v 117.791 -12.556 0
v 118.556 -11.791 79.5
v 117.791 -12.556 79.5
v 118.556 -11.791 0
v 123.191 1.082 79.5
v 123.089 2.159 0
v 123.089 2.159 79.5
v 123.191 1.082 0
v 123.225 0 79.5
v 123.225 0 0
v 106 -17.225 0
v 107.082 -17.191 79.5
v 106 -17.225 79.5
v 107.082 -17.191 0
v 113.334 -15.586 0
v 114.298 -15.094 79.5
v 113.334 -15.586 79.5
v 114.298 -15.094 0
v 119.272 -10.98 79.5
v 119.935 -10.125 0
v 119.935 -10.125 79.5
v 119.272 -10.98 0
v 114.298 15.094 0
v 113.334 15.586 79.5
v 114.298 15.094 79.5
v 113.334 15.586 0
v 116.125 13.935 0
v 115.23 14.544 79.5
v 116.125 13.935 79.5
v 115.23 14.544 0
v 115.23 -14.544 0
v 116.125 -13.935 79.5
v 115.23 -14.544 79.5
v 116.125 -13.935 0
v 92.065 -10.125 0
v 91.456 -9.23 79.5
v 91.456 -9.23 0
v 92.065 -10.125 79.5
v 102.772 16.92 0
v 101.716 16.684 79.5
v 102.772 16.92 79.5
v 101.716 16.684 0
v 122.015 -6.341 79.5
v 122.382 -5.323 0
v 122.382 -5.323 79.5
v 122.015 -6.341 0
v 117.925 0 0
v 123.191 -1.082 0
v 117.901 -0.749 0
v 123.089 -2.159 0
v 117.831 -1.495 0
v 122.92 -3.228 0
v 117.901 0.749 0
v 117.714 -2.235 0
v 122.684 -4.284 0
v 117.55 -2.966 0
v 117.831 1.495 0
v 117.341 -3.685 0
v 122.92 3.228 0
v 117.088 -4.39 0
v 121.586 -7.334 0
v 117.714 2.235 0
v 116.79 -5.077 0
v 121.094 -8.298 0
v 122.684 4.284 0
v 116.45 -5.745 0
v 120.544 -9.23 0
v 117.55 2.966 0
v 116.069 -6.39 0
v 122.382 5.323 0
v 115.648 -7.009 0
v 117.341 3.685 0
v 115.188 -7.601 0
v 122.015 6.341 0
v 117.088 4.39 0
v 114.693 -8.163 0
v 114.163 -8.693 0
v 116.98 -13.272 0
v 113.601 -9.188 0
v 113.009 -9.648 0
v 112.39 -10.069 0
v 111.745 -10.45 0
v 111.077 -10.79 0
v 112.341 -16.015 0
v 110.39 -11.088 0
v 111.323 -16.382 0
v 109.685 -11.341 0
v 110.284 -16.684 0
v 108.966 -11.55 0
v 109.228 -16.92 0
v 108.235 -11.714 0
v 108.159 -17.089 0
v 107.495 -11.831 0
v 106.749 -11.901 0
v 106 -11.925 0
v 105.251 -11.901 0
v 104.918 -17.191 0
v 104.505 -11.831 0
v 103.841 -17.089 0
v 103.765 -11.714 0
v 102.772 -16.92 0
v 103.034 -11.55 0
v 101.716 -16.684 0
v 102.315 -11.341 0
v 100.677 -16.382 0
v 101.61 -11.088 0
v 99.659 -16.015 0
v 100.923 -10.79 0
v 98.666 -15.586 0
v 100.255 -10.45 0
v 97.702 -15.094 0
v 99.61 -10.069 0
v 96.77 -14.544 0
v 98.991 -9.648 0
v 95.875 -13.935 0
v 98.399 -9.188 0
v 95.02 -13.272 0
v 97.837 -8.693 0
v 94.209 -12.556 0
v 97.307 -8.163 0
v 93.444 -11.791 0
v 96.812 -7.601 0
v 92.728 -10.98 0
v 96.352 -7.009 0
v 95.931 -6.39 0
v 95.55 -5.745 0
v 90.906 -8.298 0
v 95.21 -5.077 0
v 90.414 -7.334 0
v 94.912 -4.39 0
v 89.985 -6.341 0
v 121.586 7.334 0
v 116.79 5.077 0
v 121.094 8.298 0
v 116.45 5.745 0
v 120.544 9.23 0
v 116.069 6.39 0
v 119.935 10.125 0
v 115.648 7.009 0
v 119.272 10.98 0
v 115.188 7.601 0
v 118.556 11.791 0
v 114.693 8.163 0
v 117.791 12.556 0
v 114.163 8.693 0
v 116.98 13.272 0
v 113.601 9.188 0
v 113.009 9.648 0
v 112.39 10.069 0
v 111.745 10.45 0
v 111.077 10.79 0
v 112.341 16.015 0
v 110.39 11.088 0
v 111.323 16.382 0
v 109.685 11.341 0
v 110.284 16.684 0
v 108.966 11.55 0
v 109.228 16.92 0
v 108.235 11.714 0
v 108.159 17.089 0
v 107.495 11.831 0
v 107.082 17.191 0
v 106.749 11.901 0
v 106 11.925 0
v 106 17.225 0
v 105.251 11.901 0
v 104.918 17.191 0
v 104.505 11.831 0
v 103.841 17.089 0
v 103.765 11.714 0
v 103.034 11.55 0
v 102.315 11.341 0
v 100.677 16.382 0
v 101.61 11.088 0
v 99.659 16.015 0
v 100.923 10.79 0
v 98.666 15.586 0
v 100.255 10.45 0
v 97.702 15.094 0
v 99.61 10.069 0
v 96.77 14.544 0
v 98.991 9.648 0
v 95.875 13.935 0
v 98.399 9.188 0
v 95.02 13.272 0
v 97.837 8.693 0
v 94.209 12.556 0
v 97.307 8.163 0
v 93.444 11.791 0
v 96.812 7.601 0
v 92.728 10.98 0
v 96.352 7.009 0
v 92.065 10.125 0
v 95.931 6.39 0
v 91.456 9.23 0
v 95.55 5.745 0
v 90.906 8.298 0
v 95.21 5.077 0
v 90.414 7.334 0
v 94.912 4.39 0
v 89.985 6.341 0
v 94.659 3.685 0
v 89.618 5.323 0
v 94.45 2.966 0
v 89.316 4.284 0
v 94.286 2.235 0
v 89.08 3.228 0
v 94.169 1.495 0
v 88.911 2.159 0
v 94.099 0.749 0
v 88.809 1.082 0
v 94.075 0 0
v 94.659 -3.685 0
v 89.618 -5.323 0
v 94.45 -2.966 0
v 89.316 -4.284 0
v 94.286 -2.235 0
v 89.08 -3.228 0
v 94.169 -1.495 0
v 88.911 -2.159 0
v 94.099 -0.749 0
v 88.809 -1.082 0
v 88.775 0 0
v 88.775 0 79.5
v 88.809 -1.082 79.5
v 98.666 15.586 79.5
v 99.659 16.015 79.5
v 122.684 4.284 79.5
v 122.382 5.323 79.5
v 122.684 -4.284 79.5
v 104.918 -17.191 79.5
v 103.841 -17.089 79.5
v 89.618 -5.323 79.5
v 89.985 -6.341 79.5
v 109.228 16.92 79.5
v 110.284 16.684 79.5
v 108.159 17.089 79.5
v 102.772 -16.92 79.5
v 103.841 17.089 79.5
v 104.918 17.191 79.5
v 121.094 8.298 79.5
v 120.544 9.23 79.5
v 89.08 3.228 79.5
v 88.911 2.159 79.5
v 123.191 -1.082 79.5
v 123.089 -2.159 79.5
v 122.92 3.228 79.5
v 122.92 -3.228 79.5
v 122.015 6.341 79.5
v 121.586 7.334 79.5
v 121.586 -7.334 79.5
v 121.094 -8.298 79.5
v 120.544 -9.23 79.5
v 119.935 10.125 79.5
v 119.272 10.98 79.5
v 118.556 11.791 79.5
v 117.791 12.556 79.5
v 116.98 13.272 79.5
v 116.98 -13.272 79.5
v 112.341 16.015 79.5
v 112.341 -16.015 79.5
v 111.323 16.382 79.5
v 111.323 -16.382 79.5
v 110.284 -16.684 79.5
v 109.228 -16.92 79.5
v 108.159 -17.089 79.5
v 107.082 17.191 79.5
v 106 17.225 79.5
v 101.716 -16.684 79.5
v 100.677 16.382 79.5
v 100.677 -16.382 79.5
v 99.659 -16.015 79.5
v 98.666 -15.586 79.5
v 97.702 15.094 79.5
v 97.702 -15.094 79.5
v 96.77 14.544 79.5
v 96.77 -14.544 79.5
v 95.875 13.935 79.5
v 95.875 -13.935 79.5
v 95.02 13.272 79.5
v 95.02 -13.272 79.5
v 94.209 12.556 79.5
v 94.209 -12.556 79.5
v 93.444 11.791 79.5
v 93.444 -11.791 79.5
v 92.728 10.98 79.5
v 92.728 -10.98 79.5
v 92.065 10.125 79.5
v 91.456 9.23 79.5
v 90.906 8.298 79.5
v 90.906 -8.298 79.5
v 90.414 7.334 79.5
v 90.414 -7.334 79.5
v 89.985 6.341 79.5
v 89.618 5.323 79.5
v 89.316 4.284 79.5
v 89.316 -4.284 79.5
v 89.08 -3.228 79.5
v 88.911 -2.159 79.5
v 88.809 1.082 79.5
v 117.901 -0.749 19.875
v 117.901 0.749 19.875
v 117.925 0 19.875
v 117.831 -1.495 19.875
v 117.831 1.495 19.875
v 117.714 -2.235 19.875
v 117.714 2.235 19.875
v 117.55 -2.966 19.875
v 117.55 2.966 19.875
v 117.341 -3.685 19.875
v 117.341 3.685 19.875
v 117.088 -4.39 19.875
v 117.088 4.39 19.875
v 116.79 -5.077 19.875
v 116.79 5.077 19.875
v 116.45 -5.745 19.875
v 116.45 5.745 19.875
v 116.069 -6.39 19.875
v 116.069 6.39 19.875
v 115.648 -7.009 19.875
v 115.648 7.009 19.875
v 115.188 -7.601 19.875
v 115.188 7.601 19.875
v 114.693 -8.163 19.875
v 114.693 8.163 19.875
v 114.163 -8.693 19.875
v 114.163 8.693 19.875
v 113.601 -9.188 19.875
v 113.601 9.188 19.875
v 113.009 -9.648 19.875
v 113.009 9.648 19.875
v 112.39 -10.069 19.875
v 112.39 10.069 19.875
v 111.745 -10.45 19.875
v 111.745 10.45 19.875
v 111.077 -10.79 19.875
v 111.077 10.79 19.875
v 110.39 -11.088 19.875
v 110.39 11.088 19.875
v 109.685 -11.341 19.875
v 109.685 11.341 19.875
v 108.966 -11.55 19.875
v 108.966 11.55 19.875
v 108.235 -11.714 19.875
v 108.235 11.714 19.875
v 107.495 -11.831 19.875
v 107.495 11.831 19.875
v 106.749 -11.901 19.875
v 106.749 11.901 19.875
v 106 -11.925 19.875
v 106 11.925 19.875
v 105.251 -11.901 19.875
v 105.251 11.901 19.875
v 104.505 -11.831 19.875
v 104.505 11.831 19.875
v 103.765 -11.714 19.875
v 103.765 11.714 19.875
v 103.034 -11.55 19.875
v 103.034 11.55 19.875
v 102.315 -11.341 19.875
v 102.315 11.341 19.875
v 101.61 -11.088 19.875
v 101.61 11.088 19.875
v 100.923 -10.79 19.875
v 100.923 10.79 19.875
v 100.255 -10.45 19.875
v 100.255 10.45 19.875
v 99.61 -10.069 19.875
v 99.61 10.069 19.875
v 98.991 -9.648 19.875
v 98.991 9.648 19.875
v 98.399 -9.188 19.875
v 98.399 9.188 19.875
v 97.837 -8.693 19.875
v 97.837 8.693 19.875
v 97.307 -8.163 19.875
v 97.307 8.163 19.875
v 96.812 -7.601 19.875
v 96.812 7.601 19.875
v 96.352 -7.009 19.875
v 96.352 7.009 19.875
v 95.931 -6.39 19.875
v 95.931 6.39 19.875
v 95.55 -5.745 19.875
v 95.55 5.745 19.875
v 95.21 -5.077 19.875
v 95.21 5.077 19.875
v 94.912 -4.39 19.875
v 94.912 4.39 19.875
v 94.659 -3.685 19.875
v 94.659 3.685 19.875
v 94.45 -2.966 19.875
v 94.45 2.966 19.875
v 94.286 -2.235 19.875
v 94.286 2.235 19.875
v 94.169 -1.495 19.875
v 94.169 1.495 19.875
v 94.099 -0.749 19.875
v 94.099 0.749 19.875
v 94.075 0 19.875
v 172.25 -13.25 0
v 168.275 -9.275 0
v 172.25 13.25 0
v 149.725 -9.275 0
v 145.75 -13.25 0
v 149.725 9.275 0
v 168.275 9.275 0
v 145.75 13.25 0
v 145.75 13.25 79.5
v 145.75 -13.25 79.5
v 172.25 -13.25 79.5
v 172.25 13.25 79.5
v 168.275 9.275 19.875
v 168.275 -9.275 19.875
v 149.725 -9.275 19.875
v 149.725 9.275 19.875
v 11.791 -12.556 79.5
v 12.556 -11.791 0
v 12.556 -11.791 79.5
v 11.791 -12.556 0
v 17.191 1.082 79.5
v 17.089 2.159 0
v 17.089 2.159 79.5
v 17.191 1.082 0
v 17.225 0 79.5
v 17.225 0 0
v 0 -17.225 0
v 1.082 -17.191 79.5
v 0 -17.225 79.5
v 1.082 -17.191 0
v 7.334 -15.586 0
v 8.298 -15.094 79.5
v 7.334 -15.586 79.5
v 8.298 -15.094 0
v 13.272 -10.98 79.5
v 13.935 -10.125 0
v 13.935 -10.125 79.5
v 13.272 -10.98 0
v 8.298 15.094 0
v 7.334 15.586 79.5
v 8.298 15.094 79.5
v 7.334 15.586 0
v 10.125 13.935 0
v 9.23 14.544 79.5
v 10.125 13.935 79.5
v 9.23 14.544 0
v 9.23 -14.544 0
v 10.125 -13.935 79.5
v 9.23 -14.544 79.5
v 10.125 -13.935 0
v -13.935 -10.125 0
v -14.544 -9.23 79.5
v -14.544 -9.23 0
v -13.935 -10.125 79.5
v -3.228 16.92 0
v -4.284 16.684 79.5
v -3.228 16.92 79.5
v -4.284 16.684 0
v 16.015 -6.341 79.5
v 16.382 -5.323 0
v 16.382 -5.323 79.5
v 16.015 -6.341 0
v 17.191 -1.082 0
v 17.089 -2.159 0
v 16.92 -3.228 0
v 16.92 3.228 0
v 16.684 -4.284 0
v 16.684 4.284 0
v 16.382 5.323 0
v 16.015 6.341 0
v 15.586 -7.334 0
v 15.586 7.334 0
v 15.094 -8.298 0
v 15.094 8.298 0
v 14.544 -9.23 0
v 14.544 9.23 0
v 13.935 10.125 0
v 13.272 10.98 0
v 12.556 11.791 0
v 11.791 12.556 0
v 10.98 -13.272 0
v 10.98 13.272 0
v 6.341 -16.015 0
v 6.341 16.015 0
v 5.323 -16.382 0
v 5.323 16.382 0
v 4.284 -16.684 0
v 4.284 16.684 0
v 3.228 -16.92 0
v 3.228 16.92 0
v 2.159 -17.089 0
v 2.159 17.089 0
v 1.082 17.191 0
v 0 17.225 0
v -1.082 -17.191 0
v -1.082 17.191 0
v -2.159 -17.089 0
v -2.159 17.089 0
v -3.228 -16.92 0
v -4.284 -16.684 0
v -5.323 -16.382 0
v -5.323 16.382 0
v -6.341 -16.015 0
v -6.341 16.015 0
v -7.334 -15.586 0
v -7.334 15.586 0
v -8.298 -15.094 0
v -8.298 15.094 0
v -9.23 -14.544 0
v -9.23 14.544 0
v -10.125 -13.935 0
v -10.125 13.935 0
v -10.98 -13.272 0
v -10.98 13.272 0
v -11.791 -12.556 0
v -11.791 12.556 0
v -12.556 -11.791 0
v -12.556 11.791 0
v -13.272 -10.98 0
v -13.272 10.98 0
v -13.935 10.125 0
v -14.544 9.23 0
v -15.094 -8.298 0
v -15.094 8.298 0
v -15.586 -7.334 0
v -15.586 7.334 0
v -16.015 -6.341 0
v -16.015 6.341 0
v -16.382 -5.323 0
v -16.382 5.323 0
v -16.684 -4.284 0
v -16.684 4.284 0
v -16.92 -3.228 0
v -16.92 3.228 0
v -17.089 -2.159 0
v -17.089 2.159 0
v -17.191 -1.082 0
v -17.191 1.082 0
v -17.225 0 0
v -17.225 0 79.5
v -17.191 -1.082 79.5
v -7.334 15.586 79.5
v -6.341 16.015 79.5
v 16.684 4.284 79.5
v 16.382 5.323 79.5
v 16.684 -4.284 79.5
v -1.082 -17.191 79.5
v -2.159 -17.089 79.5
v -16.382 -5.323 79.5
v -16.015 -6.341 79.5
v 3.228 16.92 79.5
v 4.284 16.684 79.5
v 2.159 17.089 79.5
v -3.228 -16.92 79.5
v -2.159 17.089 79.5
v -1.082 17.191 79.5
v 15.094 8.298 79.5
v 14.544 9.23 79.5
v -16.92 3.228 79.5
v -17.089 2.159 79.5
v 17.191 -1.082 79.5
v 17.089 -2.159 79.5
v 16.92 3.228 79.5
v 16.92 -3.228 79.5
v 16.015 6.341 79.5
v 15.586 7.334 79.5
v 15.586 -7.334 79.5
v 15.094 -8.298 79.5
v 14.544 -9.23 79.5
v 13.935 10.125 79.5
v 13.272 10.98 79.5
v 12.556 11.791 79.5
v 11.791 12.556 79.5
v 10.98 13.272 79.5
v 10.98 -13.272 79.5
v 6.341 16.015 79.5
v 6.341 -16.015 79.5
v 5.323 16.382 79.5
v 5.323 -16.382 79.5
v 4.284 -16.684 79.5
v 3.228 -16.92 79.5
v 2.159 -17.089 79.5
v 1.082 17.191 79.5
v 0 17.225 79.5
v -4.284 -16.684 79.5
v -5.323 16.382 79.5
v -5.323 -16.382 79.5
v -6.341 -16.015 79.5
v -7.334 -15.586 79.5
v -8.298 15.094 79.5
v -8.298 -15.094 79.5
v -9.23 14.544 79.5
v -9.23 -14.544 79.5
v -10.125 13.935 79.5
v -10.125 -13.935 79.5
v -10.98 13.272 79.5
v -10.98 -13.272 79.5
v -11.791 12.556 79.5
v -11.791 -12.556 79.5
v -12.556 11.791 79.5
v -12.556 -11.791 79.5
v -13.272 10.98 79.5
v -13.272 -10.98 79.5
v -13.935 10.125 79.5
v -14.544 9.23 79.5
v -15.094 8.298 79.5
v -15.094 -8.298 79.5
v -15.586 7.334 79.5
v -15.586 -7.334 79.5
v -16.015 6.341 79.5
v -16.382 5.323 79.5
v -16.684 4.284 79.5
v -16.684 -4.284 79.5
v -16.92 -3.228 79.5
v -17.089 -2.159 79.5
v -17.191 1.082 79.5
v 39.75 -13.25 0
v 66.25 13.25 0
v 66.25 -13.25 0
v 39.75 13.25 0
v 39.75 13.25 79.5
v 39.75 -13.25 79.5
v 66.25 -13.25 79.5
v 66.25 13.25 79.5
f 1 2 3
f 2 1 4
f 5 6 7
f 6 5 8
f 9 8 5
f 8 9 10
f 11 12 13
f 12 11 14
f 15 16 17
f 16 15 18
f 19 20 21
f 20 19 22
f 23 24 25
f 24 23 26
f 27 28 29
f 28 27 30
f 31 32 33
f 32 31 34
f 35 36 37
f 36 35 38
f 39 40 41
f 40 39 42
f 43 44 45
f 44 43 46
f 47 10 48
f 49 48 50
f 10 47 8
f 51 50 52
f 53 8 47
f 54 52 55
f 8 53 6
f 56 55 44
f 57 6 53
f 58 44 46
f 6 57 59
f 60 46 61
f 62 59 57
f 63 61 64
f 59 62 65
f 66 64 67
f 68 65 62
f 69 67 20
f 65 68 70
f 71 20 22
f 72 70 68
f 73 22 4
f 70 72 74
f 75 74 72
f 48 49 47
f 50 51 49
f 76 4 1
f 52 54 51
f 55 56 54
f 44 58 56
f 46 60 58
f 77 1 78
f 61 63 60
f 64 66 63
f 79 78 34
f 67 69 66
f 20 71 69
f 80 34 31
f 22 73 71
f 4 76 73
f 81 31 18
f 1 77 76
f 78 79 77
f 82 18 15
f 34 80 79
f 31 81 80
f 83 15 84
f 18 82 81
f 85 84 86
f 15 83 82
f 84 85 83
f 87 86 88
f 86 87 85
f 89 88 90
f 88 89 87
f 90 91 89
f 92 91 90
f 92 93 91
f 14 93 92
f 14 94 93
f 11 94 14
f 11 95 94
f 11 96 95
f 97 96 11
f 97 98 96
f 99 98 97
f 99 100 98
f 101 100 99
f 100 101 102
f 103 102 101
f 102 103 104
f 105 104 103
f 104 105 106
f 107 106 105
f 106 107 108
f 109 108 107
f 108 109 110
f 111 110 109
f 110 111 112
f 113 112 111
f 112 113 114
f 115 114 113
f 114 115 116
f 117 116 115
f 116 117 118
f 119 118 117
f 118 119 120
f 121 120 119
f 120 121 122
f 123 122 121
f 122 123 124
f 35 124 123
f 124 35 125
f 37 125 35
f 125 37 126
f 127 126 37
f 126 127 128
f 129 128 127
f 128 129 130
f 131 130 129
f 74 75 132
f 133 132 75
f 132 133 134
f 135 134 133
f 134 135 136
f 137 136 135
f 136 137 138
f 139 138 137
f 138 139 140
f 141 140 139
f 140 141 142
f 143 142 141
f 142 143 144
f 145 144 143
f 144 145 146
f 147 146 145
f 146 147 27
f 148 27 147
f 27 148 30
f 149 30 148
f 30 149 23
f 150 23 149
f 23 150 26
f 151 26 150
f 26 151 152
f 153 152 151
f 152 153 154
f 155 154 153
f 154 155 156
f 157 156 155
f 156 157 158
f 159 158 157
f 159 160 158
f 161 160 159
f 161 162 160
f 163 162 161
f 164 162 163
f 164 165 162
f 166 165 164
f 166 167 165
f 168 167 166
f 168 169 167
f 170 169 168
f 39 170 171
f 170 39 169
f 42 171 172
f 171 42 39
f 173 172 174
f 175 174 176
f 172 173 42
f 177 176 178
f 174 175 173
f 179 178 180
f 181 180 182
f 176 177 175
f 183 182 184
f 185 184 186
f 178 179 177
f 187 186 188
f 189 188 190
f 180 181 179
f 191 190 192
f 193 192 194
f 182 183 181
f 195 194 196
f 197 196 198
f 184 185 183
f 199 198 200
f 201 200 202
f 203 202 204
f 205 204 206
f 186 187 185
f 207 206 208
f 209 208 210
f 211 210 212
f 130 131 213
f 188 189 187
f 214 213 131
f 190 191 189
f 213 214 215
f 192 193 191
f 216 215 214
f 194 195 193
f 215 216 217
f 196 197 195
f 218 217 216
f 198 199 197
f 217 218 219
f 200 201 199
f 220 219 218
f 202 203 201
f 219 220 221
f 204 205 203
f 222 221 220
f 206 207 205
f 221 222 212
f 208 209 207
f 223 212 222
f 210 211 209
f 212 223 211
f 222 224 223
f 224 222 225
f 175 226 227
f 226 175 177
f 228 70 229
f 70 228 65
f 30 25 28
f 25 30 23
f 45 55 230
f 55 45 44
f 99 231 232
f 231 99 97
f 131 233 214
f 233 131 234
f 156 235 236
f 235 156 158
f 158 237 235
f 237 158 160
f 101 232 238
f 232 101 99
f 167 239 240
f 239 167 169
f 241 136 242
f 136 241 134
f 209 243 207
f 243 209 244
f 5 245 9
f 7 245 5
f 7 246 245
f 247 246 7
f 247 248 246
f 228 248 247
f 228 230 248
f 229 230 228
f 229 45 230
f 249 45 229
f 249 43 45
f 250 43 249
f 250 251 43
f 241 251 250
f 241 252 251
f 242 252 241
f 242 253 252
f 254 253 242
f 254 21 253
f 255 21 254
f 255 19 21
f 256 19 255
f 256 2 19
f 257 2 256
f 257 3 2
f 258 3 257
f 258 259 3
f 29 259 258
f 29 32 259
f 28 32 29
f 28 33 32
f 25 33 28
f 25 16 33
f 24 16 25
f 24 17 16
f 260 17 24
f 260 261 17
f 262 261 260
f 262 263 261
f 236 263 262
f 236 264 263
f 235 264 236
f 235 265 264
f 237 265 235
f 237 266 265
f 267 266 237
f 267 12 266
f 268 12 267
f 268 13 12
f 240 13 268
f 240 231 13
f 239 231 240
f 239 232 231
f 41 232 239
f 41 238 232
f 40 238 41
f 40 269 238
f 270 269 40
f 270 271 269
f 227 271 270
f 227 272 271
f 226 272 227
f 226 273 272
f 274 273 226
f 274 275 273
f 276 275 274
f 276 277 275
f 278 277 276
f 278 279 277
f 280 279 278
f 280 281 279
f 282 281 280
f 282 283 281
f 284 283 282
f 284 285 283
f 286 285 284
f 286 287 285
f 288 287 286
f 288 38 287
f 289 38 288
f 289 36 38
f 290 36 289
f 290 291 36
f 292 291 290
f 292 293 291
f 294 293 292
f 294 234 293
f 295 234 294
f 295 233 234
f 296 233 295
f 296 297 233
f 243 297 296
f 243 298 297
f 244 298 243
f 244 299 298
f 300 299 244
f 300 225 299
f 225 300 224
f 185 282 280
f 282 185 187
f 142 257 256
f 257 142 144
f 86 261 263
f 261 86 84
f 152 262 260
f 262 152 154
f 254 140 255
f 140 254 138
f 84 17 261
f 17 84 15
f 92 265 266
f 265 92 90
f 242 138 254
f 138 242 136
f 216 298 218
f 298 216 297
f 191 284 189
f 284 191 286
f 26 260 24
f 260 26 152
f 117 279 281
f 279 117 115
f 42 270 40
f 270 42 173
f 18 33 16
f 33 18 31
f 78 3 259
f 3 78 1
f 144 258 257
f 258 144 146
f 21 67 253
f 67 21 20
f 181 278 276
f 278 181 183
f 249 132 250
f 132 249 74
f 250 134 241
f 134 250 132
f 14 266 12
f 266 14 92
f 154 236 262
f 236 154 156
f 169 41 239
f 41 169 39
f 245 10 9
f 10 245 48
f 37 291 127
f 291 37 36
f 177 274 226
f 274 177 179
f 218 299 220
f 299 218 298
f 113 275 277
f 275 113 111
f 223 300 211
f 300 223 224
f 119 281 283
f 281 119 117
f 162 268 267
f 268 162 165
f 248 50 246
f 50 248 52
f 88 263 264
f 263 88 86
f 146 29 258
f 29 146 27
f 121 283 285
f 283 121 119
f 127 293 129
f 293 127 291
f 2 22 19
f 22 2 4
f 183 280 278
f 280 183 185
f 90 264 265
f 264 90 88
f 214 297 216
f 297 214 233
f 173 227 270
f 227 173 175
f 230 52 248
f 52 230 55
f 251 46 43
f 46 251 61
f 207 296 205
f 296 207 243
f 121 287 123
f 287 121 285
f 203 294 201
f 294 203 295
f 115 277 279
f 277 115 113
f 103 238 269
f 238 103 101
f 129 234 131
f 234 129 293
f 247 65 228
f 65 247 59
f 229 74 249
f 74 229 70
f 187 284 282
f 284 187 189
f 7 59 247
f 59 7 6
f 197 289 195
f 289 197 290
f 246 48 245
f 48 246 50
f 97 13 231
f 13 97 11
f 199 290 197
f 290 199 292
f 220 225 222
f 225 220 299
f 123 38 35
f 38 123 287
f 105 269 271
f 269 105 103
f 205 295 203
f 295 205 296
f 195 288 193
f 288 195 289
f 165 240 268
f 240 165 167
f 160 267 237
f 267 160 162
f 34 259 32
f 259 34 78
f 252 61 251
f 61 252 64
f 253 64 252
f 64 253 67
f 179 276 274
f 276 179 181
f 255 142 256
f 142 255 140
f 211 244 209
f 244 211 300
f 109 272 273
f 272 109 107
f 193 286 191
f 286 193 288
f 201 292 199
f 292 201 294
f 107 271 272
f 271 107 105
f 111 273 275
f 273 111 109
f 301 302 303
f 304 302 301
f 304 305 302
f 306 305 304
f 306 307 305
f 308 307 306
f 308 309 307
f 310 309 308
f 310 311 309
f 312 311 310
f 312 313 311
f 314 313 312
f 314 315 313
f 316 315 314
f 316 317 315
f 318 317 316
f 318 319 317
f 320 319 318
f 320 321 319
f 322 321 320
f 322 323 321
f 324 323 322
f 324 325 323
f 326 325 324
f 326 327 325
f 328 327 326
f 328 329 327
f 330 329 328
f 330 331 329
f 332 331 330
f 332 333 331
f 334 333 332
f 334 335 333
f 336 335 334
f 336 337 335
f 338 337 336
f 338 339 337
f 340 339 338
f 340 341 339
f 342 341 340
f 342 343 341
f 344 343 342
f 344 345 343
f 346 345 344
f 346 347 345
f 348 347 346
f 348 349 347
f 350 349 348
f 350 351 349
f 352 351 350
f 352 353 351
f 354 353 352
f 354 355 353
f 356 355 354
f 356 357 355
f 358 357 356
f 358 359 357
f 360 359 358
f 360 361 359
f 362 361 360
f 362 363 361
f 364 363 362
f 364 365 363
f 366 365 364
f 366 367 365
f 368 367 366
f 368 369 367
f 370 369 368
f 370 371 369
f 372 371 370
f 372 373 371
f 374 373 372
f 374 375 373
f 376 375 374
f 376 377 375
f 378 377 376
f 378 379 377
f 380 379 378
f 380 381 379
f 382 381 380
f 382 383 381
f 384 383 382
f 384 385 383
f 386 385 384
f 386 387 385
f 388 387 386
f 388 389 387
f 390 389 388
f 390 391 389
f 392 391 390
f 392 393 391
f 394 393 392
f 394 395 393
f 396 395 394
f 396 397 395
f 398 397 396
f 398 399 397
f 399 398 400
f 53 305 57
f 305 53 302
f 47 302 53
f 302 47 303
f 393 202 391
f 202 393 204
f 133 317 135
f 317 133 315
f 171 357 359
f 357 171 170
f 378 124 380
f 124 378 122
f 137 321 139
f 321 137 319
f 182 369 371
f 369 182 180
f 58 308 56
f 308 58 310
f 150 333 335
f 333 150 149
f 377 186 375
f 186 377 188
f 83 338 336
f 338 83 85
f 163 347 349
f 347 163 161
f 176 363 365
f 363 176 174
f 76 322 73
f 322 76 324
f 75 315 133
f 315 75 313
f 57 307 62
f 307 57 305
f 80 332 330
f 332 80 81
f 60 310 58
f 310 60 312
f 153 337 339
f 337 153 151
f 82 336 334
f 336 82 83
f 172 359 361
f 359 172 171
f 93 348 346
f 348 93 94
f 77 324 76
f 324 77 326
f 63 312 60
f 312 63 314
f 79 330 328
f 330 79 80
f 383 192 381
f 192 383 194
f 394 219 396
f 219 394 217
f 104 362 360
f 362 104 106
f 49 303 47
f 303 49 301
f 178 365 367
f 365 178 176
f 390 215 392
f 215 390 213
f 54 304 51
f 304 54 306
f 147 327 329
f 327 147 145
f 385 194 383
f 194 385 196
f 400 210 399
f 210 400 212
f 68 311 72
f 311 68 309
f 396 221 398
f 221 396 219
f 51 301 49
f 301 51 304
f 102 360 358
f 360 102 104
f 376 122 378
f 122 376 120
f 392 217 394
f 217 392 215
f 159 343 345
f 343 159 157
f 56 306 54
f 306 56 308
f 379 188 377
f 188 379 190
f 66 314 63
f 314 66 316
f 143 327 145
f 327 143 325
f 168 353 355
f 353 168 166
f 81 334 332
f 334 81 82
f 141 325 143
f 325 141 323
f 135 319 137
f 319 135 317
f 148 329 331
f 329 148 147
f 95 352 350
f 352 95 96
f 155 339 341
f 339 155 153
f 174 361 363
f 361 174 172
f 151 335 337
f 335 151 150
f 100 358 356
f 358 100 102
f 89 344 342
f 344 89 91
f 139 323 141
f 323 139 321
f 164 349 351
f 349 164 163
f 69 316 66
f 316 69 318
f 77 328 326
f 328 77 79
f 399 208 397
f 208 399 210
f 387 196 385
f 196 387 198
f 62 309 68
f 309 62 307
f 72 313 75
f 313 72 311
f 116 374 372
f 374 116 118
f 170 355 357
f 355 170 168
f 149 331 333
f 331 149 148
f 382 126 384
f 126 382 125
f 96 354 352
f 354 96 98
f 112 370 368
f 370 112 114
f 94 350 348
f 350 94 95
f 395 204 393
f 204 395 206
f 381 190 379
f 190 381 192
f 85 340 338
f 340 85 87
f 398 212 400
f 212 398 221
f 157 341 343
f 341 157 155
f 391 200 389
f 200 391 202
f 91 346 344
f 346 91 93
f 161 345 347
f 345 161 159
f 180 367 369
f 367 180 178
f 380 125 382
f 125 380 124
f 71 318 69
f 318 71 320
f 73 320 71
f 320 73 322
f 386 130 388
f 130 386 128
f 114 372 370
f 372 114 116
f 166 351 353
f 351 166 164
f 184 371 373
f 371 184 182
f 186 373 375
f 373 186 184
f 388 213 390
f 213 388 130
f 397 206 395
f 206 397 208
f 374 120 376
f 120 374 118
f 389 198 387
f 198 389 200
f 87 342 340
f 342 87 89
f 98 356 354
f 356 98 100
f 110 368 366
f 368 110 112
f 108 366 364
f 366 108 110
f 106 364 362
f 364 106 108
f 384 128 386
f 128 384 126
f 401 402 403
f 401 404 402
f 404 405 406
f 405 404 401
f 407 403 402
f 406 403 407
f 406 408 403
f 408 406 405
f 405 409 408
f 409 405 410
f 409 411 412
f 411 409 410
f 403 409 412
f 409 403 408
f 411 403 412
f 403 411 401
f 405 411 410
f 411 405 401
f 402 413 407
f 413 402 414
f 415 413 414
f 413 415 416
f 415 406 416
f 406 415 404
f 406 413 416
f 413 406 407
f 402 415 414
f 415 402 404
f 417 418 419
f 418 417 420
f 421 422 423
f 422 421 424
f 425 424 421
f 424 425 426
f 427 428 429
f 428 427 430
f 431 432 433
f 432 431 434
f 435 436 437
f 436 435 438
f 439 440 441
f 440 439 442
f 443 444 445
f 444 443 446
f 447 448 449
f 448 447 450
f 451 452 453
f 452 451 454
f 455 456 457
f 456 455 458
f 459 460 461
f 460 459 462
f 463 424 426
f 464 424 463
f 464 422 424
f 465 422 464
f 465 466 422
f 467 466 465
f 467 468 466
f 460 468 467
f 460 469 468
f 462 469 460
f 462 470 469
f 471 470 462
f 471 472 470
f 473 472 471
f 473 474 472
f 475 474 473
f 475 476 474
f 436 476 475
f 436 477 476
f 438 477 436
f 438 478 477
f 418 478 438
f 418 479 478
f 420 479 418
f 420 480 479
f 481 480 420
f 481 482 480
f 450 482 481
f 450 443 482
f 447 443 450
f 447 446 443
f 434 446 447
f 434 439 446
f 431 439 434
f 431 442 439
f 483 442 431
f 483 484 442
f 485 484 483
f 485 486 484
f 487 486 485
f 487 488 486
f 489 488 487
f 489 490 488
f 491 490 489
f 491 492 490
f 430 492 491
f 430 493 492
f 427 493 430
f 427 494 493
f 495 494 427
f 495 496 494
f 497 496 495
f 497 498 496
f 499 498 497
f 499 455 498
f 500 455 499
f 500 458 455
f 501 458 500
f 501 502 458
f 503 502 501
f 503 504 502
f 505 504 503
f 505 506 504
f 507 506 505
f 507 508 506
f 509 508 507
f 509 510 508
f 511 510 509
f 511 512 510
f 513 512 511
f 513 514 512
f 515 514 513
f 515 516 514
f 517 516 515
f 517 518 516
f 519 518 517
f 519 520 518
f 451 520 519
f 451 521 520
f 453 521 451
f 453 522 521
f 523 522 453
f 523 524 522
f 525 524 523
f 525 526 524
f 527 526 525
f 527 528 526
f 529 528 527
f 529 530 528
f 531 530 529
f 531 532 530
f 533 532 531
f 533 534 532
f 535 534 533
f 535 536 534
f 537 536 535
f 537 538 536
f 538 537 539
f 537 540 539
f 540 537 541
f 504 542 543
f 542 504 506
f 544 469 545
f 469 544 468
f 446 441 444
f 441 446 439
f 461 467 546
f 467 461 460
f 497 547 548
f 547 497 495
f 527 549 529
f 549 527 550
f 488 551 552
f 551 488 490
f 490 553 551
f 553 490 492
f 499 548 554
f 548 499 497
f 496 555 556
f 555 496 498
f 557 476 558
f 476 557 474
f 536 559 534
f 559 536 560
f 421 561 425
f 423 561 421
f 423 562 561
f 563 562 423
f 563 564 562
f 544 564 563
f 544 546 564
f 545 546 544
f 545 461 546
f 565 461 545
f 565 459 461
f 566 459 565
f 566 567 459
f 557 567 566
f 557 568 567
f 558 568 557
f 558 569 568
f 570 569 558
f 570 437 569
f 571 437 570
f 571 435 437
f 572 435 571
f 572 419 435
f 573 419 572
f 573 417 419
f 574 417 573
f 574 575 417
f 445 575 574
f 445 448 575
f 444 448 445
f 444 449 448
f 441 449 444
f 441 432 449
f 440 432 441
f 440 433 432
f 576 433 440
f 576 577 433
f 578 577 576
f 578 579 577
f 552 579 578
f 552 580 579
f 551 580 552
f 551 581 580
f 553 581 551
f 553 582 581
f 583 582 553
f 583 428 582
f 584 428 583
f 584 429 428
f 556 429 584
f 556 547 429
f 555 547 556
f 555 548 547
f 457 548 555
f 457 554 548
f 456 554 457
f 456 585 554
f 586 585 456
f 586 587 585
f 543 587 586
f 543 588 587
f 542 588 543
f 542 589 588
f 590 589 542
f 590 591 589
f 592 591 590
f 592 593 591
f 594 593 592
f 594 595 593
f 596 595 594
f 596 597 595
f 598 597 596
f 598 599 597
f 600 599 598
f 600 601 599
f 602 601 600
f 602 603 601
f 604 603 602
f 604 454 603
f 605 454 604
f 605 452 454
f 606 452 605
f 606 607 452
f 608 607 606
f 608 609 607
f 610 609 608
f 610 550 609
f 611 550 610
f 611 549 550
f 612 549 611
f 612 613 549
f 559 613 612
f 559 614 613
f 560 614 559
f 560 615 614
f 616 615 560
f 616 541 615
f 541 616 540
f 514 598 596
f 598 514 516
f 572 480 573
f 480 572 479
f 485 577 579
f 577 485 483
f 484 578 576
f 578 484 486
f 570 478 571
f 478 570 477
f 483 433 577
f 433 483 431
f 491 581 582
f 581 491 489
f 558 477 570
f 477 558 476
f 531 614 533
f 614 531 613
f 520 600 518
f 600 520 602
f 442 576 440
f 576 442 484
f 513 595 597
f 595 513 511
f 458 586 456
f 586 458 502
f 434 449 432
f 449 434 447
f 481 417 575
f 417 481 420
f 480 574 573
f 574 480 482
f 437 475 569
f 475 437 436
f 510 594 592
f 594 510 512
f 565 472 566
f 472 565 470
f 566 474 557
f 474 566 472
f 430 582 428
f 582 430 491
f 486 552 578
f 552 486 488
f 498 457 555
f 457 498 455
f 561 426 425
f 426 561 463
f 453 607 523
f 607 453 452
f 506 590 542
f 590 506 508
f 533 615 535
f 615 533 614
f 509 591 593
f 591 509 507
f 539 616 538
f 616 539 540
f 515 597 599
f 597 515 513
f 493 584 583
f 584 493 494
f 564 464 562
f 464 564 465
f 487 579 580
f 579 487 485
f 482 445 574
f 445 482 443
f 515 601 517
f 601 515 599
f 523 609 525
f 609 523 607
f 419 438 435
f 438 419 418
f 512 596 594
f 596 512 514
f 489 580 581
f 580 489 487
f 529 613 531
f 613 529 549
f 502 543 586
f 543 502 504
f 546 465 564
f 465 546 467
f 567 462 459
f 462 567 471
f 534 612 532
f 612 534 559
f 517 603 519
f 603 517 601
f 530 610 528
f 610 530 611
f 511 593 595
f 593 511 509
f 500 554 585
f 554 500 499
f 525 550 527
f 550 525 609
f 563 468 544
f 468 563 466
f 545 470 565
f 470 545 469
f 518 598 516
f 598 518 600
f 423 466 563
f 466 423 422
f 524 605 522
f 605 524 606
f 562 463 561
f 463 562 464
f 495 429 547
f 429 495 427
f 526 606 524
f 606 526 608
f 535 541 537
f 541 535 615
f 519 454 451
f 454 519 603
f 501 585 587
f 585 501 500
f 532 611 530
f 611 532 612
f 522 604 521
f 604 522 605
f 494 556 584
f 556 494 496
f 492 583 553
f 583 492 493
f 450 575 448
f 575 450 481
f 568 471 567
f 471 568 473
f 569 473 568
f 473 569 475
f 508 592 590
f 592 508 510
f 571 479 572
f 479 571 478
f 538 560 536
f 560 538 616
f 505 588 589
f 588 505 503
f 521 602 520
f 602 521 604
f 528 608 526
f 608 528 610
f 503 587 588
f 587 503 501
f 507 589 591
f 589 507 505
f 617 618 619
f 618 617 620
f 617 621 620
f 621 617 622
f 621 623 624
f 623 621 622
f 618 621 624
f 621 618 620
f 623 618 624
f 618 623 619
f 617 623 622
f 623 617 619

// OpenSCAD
base_height = 3; 
inch = 26.5;
small = true;
height = small ? base_height * inch : (base_height * 2) * inch;

module solid_rounded() {
  cylinder(h=height, d=inch*1.3, $fn=100);
}

module solid_flat() {
  linear_extrude(height) {
    square(inch, center=true);
  }
}

module hollow_rounded(){
  difference() {
    solid_rounded();
    cylinder(h=height/2, d=inch*.9, center=true, $fn=100);
  }
}
    
module hollow_flat() {
  difference(){
    solid_flat();
    cube([inch*.7, inch*.7, height/2], center=true);
  }
}

solid_rounded();
translate([inch*2, 0, 0]) solid_flat();
translate([inch*4, 0, 0]) hollow_rounded();
translate([inch*6, 0, 0]) hollow_flat();
